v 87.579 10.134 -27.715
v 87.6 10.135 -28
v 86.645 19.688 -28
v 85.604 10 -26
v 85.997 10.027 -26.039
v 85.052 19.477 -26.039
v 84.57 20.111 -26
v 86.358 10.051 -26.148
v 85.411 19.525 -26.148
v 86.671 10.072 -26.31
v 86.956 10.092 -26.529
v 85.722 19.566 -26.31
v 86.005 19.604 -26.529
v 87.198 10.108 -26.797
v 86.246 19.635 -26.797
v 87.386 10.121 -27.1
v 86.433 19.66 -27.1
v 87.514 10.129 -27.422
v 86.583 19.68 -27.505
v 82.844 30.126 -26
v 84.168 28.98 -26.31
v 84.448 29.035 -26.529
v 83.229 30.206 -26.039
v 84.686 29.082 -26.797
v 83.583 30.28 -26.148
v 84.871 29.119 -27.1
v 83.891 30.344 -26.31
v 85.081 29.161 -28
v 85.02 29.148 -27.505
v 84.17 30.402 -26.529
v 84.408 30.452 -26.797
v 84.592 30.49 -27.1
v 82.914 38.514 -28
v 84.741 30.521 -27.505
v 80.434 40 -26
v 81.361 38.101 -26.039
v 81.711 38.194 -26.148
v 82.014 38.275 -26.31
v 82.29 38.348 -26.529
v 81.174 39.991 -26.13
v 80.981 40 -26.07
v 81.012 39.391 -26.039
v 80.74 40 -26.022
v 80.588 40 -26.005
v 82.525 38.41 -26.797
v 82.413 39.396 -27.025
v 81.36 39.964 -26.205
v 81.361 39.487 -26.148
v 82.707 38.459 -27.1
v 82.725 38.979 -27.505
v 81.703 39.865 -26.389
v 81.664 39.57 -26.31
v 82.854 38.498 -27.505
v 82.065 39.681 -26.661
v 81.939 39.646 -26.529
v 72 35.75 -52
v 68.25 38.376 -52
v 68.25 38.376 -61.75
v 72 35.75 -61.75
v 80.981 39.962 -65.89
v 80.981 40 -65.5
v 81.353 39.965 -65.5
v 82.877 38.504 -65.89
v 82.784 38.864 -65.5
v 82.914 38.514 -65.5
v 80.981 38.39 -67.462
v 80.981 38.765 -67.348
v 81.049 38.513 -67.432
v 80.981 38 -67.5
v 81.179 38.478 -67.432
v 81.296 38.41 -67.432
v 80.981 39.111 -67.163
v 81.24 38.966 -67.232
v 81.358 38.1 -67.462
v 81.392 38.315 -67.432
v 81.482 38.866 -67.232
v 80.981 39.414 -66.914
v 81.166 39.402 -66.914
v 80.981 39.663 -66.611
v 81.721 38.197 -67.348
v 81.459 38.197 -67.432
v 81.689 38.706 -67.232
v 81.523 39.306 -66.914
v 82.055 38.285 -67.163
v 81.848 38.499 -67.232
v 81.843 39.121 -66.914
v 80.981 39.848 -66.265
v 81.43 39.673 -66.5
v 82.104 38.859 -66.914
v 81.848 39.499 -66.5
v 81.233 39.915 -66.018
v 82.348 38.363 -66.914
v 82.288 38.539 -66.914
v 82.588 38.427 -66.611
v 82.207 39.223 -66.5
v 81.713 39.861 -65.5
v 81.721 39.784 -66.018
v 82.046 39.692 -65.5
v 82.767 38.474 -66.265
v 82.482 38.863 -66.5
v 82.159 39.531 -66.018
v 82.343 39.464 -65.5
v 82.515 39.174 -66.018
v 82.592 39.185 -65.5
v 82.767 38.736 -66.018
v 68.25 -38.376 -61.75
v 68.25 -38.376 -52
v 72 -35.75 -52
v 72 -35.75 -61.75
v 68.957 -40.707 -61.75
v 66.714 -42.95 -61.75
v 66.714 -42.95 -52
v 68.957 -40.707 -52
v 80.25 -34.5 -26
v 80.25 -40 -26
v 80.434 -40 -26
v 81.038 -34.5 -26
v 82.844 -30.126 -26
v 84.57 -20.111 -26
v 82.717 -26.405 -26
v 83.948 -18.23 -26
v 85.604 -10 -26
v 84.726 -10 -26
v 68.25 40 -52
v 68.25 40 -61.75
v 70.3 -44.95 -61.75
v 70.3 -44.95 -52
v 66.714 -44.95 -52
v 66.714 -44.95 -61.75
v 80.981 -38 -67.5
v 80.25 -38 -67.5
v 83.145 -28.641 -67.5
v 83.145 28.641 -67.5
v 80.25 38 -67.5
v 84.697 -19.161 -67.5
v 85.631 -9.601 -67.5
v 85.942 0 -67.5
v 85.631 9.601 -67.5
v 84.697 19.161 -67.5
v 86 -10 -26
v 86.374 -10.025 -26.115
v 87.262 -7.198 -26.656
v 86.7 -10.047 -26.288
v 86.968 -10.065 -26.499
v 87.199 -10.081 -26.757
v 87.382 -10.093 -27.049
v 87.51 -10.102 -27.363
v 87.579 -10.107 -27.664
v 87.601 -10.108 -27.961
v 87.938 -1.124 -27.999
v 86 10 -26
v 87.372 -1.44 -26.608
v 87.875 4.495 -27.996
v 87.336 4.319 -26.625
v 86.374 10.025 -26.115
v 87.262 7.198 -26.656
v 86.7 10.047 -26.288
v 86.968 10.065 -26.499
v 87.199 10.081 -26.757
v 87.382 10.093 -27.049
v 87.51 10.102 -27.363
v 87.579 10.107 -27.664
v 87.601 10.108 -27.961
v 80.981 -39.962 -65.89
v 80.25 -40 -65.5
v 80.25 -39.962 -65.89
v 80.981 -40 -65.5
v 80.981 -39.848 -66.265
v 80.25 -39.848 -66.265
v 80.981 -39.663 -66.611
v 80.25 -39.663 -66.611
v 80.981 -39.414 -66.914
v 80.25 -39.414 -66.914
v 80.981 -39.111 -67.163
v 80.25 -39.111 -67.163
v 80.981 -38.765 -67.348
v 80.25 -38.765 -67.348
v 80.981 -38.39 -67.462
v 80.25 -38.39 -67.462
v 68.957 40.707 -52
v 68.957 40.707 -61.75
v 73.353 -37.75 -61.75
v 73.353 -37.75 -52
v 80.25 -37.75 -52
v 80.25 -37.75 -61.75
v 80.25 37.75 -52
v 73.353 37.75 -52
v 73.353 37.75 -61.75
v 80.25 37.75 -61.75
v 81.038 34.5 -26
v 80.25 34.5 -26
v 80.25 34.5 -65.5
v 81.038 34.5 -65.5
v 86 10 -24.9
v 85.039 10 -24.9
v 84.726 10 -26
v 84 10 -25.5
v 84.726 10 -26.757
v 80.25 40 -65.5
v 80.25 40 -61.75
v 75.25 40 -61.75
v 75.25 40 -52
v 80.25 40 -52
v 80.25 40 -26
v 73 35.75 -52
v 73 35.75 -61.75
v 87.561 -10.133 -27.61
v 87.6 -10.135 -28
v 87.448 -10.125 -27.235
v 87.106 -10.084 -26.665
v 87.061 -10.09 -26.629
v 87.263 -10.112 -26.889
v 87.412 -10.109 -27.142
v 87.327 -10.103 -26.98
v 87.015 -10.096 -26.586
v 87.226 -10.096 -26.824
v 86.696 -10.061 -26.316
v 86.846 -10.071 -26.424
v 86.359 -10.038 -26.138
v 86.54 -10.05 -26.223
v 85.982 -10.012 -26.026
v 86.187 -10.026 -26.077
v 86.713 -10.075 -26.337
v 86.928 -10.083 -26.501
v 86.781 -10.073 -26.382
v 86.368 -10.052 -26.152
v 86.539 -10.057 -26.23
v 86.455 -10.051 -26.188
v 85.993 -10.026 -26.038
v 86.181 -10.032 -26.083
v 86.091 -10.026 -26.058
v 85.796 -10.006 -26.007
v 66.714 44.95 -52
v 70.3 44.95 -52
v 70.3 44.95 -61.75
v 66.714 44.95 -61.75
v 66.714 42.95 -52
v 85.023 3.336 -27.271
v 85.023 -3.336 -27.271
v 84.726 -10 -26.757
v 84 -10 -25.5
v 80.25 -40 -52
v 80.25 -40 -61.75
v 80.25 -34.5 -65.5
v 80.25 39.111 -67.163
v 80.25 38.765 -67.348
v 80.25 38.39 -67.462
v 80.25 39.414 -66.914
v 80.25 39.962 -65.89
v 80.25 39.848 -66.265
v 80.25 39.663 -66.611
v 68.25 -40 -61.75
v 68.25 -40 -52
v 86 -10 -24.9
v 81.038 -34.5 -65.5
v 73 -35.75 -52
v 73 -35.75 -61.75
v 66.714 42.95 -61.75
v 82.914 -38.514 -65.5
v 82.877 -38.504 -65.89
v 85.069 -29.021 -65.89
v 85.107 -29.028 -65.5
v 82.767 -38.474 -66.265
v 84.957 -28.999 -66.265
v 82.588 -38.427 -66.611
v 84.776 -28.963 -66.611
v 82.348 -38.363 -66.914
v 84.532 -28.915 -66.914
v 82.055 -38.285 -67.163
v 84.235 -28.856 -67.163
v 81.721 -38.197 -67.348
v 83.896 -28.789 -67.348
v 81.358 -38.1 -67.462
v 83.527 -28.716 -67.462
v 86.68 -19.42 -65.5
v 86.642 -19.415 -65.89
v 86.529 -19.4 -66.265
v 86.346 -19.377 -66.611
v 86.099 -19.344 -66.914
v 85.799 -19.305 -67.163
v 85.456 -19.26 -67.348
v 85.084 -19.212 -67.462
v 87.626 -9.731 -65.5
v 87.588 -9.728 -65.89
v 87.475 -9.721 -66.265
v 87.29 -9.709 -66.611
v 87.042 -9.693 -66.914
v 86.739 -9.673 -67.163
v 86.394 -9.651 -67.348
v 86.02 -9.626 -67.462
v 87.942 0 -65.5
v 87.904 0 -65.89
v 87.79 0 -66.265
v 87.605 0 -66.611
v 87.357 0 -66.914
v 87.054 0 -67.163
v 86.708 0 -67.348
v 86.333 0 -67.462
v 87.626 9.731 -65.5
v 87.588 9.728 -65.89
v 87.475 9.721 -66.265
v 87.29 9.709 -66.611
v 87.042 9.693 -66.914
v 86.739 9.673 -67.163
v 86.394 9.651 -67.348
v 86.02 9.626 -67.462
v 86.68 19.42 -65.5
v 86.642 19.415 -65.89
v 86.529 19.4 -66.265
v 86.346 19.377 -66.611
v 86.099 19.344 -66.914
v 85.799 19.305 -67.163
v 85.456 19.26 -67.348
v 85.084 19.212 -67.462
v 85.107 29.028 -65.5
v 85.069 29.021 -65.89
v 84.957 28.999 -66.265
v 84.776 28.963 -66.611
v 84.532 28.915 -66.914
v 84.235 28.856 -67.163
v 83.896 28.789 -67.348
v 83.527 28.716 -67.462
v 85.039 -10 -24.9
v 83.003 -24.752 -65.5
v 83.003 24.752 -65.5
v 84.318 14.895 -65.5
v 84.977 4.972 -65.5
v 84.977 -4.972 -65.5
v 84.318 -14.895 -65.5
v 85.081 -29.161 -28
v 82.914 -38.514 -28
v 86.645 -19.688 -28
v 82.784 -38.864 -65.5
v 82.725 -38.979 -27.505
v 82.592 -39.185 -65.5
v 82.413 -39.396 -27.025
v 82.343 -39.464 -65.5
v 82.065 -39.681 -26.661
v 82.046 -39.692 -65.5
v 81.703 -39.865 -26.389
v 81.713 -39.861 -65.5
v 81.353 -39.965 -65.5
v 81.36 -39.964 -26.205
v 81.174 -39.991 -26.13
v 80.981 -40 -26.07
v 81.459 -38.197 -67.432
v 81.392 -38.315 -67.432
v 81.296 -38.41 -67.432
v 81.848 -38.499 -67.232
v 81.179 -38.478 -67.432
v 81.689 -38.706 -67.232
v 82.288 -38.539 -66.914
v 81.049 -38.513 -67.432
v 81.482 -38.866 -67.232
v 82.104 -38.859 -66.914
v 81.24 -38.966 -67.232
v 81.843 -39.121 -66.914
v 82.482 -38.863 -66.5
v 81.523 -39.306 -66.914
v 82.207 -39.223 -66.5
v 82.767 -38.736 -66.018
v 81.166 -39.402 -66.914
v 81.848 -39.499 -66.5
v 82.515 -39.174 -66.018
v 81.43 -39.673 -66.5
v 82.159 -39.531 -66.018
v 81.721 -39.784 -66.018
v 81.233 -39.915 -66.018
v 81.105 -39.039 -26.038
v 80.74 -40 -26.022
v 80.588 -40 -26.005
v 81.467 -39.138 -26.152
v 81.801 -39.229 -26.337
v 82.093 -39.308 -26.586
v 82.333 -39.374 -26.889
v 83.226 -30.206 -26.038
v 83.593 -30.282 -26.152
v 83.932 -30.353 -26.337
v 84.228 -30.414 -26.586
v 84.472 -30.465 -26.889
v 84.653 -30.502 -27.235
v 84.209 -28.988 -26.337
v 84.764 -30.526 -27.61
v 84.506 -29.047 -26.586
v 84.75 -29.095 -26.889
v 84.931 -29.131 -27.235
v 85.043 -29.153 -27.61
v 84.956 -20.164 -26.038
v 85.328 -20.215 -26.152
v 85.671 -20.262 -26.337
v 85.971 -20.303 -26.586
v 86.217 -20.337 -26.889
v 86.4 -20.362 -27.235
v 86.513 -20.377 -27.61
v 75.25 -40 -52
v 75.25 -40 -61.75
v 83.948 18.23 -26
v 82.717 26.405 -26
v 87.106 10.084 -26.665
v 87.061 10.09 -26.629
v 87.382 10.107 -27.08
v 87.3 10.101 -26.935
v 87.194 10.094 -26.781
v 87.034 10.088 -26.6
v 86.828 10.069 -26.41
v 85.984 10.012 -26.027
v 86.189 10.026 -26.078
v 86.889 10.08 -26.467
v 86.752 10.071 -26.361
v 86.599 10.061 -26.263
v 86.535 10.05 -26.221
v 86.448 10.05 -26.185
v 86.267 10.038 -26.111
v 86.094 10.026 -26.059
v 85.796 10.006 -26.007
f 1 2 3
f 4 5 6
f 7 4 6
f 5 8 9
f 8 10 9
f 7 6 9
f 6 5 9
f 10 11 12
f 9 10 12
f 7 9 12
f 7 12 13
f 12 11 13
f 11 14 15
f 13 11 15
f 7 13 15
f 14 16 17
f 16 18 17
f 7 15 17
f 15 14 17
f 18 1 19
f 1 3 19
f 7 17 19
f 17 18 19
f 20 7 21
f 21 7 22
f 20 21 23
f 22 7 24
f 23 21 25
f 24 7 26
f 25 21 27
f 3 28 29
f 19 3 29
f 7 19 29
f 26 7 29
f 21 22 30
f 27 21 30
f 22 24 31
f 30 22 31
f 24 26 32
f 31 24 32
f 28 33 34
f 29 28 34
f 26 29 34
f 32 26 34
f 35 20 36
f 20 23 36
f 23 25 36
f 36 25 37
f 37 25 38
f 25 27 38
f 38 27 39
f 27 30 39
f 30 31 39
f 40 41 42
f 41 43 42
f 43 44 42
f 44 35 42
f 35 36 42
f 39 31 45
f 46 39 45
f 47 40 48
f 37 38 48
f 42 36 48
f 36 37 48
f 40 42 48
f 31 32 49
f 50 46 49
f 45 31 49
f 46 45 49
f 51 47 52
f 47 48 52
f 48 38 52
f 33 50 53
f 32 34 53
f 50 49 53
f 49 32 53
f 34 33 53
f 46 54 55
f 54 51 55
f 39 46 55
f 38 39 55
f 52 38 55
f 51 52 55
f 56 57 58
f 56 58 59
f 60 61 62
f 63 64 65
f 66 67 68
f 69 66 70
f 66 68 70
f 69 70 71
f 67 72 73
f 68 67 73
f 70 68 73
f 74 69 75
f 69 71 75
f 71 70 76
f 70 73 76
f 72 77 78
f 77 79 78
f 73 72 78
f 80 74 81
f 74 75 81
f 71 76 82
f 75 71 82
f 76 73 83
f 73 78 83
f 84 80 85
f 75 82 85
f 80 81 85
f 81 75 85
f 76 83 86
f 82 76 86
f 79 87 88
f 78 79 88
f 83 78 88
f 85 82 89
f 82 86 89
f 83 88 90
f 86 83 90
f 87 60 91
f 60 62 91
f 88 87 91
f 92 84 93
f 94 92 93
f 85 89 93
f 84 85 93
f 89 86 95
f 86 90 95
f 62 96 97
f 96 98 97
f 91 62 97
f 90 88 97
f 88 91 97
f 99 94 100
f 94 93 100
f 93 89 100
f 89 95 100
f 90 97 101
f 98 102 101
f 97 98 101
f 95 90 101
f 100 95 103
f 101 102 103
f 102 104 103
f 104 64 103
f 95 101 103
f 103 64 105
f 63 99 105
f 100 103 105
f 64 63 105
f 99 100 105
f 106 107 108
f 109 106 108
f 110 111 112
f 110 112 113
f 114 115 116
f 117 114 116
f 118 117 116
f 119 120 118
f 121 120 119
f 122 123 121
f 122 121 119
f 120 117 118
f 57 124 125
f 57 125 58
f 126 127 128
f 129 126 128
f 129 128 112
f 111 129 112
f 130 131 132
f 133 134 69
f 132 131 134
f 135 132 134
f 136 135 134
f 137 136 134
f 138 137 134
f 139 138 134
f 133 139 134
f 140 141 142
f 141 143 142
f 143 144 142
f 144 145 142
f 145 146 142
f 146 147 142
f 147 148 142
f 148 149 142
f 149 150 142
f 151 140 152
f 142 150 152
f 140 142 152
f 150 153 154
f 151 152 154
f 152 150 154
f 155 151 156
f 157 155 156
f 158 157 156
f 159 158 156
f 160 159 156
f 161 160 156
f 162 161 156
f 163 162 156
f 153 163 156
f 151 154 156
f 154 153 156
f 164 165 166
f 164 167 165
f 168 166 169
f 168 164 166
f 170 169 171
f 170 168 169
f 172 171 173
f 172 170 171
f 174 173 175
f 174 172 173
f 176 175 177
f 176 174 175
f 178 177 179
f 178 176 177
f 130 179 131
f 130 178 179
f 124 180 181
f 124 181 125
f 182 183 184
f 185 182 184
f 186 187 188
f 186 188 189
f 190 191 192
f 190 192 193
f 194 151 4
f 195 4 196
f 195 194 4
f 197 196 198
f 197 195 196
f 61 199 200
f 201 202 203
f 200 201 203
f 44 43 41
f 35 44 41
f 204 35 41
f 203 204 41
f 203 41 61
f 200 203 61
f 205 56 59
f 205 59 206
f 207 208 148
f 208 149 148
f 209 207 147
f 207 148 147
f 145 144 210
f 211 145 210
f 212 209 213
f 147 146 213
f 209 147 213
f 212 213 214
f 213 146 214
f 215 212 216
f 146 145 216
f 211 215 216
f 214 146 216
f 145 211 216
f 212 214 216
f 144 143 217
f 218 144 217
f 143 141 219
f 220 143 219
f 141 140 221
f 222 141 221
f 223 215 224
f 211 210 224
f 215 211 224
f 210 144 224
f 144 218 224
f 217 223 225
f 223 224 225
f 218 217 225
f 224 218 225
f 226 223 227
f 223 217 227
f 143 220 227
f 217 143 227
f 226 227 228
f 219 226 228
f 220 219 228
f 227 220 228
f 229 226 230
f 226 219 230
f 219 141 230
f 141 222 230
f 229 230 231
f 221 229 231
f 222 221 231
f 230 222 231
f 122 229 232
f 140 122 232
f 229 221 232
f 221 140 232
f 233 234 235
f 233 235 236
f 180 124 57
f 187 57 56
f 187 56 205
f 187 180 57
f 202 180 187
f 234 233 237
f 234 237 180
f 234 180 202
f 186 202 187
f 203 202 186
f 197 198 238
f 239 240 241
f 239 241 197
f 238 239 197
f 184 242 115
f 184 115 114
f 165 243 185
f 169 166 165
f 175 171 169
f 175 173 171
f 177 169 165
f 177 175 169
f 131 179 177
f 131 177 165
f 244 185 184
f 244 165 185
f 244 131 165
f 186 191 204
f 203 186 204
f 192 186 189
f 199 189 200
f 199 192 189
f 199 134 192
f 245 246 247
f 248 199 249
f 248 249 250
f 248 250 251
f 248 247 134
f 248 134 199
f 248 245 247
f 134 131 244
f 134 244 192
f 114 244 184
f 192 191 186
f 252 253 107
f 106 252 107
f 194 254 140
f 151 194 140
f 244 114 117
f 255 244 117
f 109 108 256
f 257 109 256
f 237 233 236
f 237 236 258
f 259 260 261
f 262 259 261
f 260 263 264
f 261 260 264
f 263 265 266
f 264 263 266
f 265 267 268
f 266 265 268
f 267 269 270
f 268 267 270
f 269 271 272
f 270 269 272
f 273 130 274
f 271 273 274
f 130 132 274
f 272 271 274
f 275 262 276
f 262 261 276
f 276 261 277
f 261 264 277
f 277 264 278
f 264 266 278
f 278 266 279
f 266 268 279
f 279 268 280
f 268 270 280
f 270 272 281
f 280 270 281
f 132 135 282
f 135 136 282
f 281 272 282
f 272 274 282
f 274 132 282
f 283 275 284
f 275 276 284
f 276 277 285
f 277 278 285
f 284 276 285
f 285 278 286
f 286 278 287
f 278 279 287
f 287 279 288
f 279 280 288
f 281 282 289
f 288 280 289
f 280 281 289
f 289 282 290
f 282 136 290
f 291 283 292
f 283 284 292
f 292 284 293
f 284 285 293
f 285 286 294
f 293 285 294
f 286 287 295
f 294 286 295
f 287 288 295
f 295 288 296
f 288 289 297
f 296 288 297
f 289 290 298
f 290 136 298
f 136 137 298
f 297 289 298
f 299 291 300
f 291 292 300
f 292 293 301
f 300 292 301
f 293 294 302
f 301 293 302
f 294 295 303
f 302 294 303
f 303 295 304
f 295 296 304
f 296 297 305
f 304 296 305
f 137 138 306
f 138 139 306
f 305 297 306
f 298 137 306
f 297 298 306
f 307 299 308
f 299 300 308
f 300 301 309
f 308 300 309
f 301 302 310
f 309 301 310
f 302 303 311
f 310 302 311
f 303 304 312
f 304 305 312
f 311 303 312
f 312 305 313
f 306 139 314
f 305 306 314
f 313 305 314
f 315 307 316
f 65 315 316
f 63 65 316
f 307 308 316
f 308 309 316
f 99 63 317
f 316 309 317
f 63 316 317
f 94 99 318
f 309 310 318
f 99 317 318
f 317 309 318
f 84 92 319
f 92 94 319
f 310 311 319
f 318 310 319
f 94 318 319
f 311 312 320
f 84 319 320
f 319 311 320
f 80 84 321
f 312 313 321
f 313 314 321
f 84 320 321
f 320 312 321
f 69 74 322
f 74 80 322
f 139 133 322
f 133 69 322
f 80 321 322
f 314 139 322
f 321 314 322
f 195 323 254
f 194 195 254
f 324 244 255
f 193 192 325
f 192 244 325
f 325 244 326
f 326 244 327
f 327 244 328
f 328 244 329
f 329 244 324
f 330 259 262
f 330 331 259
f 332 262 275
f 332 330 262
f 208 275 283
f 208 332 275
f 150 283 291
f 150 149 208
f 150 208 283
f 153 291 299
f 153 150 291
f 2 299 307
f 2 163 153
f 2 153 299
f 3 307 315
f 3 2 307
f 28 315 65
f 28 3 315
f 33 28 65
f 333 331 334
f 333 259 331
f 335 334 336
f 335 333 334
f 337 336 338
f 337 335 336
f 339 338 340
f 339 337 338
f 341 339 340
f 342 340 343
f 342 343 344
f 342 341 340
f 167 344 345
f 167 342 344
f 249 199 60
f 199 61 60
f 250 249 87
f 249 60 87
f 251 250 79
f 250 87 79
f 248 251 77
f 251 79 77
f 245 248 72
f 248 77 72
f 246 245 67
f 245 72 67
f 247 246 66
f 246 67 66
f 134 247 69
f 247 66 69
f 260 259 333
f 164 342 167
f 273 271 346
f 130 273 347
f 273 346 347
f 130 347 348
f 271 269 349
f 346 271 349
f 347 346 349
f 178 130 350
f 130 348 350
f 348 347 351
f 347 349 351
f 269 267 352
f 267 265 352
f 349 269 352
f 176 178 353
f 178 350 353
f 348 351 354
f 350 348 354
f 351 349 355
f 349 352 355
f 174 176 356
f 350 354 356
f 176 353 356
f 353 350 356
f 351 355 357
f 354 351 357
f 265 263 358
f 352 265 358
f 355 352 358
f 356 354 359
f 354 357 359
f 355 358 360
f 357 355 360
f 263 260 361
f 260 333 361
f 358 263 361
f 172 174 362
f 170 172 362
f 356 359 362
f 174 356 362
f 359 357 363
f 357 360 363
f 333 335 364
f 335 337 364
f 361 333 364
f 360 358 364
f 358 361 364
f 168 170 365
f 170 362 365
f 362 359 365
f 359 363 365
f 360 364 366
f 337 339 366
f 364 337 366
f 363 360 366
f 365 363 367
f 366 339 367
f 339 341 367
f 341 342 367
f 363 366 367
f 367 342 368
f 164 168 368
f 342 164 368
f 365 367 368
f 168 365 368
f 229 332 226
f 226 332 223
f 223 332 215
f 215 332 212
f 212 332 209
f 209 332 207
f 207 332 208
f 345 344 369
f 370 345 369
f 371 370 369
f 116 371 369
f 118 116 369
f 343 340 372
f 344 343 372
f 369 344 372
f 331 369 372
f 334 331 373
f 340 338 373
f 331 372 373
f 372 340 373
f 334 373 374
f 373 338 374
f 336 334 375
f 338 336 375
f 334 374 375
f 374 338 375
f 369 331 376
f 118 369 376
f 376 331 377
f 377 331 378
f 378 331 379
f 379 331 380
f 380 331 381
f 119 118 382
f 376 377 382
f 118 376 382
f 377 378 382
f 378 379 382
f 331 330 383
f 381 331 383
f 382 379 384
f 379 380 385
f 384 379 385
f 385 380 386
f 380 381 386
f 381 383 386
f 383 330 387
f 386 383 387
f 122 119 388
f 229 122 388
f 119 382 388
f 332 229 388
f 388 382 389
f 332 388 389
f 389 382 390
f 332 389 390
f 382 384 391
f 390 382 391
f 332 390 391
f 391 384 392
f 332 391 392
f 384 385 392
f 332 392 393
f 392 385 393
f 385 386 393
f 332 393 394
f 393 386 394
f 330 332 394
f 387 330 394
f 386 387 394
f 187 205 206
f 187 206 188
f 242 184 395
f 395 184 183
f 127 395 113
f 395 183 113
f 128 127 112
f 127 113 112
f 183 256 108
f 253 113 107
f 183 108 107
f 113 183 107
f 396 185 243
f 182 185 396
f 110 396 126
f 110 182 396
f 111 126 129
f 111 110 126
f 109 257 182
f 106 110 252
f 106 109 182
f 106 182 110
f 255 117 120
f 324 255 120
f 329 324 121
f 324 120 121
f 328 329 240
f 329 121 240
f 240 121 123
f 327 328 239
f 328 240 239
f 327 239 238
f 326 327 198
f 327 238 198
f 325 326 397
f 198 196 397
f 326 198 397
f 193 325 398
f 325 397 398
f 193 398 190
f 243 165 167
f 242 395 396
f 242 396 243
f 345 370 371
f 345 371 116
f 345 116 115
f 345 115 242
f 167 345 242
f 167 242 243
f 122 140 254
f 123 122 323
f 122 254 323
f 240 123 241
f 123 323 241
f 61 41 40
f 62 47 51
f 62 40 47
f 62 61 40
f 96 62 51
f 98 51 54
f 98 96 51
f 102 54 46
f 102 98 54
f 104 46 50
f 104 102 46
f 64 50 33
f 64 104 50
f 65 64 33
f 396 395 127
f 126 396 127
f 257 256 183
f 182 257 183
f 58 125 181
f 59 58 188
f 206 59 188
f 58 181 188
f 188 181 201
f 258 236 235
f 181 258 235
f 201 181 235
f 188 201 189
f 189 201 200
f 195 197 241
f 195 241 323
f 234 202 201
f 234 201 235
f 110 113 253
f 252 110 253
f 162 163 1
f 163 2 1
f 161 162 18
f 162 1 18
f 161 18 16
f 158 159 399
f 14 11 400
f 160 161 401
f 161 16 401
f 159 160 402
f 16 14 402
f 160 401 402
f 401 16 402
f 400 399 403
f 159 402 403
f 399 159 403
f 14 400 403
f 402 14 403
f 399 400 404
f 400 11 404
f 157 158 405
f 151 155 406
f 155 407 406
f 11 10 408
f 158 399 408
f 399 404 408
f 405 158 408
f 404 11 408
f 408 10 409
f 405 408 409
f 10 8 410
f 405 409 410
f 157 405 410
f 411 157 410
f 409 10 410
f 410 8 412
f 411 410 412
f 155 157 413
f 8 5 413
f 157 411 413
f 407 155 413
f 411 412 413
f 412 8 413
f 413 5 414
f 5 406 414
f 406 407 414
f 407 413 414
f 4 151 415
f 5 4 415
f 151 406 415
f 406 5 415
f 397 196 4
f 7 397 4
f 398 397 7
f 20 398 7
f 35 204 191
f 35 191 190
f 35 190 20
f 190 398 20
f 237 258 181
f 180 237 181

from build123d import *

# Parameters (mm, degrees)
EXTRUDE136083_DEPTH                     = 20
EXTRUDE136083_ONTO_SKETCH302_ROLL_ANGLE = 90
EXTRUDE136073_DEPTH                     = 9.75
BOX023_W                                = 25
BOX023_H                                = 80
BOX023_DEPTH                            = 51
EXTRUDE136056_DEPTH                     = 40
EXTRUDE136055_DEPTH                     = 42
FILLET007_R                             = 2


with BuildPart() as extrude136083:
    # Sketch302 as drawn → Extrude136083 (new)
    with BuildSketch(Plane.XY):
        Polygon((2, -3.464102), (0, 0), (1.03923, 0.6), (2, 0.6), align=None)
    extrude(amount=-EXTRUDE136083_DEPTH)


with BuildPart() as extrude136083_1:
    # Extrude136083 onto Sketch302 roll: moved
    add(extrude136083.part.rotate(Axis((0, 0, 0), (1, 0, 0)), EXTRUDE136083_ONTO_SKETCH302_ROLL_ANGLE))


with BuildPart() as extrude136083_2:
    # Extrude136083 onto Sketch302 placement: moved
    add(extrude136083_1.part.moved(Location((0, -10, 0))))


with BuildPart() as extrude136083_3:
    # Extrude136083 placement: moved
    add(extrude136083_2.part.moved(Location((84, 0, 0))))


with BuildPart() as fusion034004041072:
    # Sketch294 → Extrude136073 (new body)
    with BuildSketch(Plane.XY):
        Polygon((-1, 35.75), (0, 35.75), (0.352654, 37.75), (8.25, 37.75), (8.25, 40), (2.25, 40), (-2.699747, 44.949747), (-6.285534, 44.949747), (-6.285534, 42.949747), (-4.042893, 40.707107), (-4.75, 40), (-4.75, 38.375778), align=None)
        Polygon((-1, -35.75), (0, -35.75), (0.352654, -37.75), (8.25, -37.75), (8.25, -40), (2.25, -40), (-2.699747, -44.949747), (-6.285534, -44.949747), (-6.285534, -42.949747), (-4.042893, -40.707107), (-4.75, -40), (-4.75, -38.375778), align=None)
    extrude(amount=-EXTRUDE136073_DEPTH)


with BuildPart() as fusion034004041072_1:
    # Extrude136073 placement: moved
    add(fusion034004041072.part.moved(Location((73, 0, -26.5))))

    # Fusion034004041072: union Extrude136083
    add(extrude136083_3.part)


with BuildPart() as cube020:
    # Box023 → Box023 (new body)
    with BuildSketch(Plane(origin=(80.25, -40, -51.5), x_dir=(1, 0, 0), z_dir=(0, 0, 1))):
        with Locations((12.5, 40)):
            Rectangle(BOX023_W, BOX023_H)
    extrude(amount=BOX023_DEPTH)


with BuildPart() as extrude136056:
    # Sketch277 → Extrude136056 (new body)
    with BuildSketch(Plane.XY):
        with BuildLine():
            ThreePointArc((81.0383, -34.5), (85.059706, 0), (81.0383, 34.5))
            Line((66.5383, 34.5), (81.0383, 34.5))
            Line((63.0383, 38), (66.5383, 34.5))
            Line((40.0383, 38), (63.0383, 38))
            Line((27.5383, 25.5), (40.0383, 38))
            Line((12.636376, 25.5), (27.5383, 25.5))
            Line((10.0383, 30), (12.636376, 25.5))
            Line((10.0383, 30), (-52.9617, 30))
            Line((-62.9617, 26), (-52.9617, 30))
            Line((-82.9617, 25), (-62.9617, 26))
            ThreePointArc((-82.9617, 25), (-85.059706, 0), (-82.9617, -25))
            Line((-82.9617, -25), (-62.9617, -26))
            Line((-62.9617, -26), (-52.9617, -30))
            Line((10.0383, -30), (-52.9617, -30))
            Line((10.0383, -30), (12.636376, -25.5))
            Line((12.636376, -25.5), (27.5383, -25.5))
            Line((27.5383, -25.5), (40.0383, -38))
            Line((40.0383, -38), (63.0383, -38))
            Line((63.0383, -38), (66.5383, -34.5))
            Line((66.5383, -34.5), (81.0383, -34.5))
        make_face()
    extrude(amount=-EXTRUDE136056_DEPTH)


with BuildPart() as batterycoverfillet007:
    # Sketch276 → Extrude136055 (new body)
    with BuildSketch(Plane.XY):
        with BuildLine():
            ThreePointArc((-84.489299, 32), (-87.942378, 0), (-84.489299, -32))
            Line((-84.489299, -32), (29.510701, -32))
            Line((29.510701, -32), (37.510701, -40))
            Line((37.510701, -40), (82.510701, -40))
            ThreePointArc((82.510701, -40), (87.942378, 0), (82.510701, 40))
            Line((37.510701, 40), (82.510701, 40))
            Line((29.510701, 32), (37.510701, 40))
            Line((-84.489299, 32), (29.510701, 32))
        make_face()
    extrude(amount=-EXTRUDE136055_DEPTH)

    # Cut009010006006006005016: cut Extrude136056
    add(extrude136056.part, mode=Mode.SUBTRACT)

    # Common001: intersect Cube020
    add(cube020.part, mode=Mode.INTERSECT)

    # Fusion034004041073: union Fusion034004041072
    add(fusion034004041072_1.part)

    # Fillet007
    fillet007_edges = [batterycoverfillet007.edges().sort_by_distance(p)[0] for p in [
        (81.380351, 40, -42),
        (87.942378, 0, -42),
        (81.380351, -40, -42),
        (82.510701, 40, -21.25),
        (87.942378, 0, -0.5),
        (82.510701, -40, -21.25),
    ]]
    fillet(fillet007_edges, radius=FILLET007_R)


with BuildPart() as batterycoverfillet007_1:
    # Fillet007 placement: moved
    add(batterycoverfillet007.part.moved(Location((0, 0, -25.5))))


solid = batterycoverfillet007_1.part
